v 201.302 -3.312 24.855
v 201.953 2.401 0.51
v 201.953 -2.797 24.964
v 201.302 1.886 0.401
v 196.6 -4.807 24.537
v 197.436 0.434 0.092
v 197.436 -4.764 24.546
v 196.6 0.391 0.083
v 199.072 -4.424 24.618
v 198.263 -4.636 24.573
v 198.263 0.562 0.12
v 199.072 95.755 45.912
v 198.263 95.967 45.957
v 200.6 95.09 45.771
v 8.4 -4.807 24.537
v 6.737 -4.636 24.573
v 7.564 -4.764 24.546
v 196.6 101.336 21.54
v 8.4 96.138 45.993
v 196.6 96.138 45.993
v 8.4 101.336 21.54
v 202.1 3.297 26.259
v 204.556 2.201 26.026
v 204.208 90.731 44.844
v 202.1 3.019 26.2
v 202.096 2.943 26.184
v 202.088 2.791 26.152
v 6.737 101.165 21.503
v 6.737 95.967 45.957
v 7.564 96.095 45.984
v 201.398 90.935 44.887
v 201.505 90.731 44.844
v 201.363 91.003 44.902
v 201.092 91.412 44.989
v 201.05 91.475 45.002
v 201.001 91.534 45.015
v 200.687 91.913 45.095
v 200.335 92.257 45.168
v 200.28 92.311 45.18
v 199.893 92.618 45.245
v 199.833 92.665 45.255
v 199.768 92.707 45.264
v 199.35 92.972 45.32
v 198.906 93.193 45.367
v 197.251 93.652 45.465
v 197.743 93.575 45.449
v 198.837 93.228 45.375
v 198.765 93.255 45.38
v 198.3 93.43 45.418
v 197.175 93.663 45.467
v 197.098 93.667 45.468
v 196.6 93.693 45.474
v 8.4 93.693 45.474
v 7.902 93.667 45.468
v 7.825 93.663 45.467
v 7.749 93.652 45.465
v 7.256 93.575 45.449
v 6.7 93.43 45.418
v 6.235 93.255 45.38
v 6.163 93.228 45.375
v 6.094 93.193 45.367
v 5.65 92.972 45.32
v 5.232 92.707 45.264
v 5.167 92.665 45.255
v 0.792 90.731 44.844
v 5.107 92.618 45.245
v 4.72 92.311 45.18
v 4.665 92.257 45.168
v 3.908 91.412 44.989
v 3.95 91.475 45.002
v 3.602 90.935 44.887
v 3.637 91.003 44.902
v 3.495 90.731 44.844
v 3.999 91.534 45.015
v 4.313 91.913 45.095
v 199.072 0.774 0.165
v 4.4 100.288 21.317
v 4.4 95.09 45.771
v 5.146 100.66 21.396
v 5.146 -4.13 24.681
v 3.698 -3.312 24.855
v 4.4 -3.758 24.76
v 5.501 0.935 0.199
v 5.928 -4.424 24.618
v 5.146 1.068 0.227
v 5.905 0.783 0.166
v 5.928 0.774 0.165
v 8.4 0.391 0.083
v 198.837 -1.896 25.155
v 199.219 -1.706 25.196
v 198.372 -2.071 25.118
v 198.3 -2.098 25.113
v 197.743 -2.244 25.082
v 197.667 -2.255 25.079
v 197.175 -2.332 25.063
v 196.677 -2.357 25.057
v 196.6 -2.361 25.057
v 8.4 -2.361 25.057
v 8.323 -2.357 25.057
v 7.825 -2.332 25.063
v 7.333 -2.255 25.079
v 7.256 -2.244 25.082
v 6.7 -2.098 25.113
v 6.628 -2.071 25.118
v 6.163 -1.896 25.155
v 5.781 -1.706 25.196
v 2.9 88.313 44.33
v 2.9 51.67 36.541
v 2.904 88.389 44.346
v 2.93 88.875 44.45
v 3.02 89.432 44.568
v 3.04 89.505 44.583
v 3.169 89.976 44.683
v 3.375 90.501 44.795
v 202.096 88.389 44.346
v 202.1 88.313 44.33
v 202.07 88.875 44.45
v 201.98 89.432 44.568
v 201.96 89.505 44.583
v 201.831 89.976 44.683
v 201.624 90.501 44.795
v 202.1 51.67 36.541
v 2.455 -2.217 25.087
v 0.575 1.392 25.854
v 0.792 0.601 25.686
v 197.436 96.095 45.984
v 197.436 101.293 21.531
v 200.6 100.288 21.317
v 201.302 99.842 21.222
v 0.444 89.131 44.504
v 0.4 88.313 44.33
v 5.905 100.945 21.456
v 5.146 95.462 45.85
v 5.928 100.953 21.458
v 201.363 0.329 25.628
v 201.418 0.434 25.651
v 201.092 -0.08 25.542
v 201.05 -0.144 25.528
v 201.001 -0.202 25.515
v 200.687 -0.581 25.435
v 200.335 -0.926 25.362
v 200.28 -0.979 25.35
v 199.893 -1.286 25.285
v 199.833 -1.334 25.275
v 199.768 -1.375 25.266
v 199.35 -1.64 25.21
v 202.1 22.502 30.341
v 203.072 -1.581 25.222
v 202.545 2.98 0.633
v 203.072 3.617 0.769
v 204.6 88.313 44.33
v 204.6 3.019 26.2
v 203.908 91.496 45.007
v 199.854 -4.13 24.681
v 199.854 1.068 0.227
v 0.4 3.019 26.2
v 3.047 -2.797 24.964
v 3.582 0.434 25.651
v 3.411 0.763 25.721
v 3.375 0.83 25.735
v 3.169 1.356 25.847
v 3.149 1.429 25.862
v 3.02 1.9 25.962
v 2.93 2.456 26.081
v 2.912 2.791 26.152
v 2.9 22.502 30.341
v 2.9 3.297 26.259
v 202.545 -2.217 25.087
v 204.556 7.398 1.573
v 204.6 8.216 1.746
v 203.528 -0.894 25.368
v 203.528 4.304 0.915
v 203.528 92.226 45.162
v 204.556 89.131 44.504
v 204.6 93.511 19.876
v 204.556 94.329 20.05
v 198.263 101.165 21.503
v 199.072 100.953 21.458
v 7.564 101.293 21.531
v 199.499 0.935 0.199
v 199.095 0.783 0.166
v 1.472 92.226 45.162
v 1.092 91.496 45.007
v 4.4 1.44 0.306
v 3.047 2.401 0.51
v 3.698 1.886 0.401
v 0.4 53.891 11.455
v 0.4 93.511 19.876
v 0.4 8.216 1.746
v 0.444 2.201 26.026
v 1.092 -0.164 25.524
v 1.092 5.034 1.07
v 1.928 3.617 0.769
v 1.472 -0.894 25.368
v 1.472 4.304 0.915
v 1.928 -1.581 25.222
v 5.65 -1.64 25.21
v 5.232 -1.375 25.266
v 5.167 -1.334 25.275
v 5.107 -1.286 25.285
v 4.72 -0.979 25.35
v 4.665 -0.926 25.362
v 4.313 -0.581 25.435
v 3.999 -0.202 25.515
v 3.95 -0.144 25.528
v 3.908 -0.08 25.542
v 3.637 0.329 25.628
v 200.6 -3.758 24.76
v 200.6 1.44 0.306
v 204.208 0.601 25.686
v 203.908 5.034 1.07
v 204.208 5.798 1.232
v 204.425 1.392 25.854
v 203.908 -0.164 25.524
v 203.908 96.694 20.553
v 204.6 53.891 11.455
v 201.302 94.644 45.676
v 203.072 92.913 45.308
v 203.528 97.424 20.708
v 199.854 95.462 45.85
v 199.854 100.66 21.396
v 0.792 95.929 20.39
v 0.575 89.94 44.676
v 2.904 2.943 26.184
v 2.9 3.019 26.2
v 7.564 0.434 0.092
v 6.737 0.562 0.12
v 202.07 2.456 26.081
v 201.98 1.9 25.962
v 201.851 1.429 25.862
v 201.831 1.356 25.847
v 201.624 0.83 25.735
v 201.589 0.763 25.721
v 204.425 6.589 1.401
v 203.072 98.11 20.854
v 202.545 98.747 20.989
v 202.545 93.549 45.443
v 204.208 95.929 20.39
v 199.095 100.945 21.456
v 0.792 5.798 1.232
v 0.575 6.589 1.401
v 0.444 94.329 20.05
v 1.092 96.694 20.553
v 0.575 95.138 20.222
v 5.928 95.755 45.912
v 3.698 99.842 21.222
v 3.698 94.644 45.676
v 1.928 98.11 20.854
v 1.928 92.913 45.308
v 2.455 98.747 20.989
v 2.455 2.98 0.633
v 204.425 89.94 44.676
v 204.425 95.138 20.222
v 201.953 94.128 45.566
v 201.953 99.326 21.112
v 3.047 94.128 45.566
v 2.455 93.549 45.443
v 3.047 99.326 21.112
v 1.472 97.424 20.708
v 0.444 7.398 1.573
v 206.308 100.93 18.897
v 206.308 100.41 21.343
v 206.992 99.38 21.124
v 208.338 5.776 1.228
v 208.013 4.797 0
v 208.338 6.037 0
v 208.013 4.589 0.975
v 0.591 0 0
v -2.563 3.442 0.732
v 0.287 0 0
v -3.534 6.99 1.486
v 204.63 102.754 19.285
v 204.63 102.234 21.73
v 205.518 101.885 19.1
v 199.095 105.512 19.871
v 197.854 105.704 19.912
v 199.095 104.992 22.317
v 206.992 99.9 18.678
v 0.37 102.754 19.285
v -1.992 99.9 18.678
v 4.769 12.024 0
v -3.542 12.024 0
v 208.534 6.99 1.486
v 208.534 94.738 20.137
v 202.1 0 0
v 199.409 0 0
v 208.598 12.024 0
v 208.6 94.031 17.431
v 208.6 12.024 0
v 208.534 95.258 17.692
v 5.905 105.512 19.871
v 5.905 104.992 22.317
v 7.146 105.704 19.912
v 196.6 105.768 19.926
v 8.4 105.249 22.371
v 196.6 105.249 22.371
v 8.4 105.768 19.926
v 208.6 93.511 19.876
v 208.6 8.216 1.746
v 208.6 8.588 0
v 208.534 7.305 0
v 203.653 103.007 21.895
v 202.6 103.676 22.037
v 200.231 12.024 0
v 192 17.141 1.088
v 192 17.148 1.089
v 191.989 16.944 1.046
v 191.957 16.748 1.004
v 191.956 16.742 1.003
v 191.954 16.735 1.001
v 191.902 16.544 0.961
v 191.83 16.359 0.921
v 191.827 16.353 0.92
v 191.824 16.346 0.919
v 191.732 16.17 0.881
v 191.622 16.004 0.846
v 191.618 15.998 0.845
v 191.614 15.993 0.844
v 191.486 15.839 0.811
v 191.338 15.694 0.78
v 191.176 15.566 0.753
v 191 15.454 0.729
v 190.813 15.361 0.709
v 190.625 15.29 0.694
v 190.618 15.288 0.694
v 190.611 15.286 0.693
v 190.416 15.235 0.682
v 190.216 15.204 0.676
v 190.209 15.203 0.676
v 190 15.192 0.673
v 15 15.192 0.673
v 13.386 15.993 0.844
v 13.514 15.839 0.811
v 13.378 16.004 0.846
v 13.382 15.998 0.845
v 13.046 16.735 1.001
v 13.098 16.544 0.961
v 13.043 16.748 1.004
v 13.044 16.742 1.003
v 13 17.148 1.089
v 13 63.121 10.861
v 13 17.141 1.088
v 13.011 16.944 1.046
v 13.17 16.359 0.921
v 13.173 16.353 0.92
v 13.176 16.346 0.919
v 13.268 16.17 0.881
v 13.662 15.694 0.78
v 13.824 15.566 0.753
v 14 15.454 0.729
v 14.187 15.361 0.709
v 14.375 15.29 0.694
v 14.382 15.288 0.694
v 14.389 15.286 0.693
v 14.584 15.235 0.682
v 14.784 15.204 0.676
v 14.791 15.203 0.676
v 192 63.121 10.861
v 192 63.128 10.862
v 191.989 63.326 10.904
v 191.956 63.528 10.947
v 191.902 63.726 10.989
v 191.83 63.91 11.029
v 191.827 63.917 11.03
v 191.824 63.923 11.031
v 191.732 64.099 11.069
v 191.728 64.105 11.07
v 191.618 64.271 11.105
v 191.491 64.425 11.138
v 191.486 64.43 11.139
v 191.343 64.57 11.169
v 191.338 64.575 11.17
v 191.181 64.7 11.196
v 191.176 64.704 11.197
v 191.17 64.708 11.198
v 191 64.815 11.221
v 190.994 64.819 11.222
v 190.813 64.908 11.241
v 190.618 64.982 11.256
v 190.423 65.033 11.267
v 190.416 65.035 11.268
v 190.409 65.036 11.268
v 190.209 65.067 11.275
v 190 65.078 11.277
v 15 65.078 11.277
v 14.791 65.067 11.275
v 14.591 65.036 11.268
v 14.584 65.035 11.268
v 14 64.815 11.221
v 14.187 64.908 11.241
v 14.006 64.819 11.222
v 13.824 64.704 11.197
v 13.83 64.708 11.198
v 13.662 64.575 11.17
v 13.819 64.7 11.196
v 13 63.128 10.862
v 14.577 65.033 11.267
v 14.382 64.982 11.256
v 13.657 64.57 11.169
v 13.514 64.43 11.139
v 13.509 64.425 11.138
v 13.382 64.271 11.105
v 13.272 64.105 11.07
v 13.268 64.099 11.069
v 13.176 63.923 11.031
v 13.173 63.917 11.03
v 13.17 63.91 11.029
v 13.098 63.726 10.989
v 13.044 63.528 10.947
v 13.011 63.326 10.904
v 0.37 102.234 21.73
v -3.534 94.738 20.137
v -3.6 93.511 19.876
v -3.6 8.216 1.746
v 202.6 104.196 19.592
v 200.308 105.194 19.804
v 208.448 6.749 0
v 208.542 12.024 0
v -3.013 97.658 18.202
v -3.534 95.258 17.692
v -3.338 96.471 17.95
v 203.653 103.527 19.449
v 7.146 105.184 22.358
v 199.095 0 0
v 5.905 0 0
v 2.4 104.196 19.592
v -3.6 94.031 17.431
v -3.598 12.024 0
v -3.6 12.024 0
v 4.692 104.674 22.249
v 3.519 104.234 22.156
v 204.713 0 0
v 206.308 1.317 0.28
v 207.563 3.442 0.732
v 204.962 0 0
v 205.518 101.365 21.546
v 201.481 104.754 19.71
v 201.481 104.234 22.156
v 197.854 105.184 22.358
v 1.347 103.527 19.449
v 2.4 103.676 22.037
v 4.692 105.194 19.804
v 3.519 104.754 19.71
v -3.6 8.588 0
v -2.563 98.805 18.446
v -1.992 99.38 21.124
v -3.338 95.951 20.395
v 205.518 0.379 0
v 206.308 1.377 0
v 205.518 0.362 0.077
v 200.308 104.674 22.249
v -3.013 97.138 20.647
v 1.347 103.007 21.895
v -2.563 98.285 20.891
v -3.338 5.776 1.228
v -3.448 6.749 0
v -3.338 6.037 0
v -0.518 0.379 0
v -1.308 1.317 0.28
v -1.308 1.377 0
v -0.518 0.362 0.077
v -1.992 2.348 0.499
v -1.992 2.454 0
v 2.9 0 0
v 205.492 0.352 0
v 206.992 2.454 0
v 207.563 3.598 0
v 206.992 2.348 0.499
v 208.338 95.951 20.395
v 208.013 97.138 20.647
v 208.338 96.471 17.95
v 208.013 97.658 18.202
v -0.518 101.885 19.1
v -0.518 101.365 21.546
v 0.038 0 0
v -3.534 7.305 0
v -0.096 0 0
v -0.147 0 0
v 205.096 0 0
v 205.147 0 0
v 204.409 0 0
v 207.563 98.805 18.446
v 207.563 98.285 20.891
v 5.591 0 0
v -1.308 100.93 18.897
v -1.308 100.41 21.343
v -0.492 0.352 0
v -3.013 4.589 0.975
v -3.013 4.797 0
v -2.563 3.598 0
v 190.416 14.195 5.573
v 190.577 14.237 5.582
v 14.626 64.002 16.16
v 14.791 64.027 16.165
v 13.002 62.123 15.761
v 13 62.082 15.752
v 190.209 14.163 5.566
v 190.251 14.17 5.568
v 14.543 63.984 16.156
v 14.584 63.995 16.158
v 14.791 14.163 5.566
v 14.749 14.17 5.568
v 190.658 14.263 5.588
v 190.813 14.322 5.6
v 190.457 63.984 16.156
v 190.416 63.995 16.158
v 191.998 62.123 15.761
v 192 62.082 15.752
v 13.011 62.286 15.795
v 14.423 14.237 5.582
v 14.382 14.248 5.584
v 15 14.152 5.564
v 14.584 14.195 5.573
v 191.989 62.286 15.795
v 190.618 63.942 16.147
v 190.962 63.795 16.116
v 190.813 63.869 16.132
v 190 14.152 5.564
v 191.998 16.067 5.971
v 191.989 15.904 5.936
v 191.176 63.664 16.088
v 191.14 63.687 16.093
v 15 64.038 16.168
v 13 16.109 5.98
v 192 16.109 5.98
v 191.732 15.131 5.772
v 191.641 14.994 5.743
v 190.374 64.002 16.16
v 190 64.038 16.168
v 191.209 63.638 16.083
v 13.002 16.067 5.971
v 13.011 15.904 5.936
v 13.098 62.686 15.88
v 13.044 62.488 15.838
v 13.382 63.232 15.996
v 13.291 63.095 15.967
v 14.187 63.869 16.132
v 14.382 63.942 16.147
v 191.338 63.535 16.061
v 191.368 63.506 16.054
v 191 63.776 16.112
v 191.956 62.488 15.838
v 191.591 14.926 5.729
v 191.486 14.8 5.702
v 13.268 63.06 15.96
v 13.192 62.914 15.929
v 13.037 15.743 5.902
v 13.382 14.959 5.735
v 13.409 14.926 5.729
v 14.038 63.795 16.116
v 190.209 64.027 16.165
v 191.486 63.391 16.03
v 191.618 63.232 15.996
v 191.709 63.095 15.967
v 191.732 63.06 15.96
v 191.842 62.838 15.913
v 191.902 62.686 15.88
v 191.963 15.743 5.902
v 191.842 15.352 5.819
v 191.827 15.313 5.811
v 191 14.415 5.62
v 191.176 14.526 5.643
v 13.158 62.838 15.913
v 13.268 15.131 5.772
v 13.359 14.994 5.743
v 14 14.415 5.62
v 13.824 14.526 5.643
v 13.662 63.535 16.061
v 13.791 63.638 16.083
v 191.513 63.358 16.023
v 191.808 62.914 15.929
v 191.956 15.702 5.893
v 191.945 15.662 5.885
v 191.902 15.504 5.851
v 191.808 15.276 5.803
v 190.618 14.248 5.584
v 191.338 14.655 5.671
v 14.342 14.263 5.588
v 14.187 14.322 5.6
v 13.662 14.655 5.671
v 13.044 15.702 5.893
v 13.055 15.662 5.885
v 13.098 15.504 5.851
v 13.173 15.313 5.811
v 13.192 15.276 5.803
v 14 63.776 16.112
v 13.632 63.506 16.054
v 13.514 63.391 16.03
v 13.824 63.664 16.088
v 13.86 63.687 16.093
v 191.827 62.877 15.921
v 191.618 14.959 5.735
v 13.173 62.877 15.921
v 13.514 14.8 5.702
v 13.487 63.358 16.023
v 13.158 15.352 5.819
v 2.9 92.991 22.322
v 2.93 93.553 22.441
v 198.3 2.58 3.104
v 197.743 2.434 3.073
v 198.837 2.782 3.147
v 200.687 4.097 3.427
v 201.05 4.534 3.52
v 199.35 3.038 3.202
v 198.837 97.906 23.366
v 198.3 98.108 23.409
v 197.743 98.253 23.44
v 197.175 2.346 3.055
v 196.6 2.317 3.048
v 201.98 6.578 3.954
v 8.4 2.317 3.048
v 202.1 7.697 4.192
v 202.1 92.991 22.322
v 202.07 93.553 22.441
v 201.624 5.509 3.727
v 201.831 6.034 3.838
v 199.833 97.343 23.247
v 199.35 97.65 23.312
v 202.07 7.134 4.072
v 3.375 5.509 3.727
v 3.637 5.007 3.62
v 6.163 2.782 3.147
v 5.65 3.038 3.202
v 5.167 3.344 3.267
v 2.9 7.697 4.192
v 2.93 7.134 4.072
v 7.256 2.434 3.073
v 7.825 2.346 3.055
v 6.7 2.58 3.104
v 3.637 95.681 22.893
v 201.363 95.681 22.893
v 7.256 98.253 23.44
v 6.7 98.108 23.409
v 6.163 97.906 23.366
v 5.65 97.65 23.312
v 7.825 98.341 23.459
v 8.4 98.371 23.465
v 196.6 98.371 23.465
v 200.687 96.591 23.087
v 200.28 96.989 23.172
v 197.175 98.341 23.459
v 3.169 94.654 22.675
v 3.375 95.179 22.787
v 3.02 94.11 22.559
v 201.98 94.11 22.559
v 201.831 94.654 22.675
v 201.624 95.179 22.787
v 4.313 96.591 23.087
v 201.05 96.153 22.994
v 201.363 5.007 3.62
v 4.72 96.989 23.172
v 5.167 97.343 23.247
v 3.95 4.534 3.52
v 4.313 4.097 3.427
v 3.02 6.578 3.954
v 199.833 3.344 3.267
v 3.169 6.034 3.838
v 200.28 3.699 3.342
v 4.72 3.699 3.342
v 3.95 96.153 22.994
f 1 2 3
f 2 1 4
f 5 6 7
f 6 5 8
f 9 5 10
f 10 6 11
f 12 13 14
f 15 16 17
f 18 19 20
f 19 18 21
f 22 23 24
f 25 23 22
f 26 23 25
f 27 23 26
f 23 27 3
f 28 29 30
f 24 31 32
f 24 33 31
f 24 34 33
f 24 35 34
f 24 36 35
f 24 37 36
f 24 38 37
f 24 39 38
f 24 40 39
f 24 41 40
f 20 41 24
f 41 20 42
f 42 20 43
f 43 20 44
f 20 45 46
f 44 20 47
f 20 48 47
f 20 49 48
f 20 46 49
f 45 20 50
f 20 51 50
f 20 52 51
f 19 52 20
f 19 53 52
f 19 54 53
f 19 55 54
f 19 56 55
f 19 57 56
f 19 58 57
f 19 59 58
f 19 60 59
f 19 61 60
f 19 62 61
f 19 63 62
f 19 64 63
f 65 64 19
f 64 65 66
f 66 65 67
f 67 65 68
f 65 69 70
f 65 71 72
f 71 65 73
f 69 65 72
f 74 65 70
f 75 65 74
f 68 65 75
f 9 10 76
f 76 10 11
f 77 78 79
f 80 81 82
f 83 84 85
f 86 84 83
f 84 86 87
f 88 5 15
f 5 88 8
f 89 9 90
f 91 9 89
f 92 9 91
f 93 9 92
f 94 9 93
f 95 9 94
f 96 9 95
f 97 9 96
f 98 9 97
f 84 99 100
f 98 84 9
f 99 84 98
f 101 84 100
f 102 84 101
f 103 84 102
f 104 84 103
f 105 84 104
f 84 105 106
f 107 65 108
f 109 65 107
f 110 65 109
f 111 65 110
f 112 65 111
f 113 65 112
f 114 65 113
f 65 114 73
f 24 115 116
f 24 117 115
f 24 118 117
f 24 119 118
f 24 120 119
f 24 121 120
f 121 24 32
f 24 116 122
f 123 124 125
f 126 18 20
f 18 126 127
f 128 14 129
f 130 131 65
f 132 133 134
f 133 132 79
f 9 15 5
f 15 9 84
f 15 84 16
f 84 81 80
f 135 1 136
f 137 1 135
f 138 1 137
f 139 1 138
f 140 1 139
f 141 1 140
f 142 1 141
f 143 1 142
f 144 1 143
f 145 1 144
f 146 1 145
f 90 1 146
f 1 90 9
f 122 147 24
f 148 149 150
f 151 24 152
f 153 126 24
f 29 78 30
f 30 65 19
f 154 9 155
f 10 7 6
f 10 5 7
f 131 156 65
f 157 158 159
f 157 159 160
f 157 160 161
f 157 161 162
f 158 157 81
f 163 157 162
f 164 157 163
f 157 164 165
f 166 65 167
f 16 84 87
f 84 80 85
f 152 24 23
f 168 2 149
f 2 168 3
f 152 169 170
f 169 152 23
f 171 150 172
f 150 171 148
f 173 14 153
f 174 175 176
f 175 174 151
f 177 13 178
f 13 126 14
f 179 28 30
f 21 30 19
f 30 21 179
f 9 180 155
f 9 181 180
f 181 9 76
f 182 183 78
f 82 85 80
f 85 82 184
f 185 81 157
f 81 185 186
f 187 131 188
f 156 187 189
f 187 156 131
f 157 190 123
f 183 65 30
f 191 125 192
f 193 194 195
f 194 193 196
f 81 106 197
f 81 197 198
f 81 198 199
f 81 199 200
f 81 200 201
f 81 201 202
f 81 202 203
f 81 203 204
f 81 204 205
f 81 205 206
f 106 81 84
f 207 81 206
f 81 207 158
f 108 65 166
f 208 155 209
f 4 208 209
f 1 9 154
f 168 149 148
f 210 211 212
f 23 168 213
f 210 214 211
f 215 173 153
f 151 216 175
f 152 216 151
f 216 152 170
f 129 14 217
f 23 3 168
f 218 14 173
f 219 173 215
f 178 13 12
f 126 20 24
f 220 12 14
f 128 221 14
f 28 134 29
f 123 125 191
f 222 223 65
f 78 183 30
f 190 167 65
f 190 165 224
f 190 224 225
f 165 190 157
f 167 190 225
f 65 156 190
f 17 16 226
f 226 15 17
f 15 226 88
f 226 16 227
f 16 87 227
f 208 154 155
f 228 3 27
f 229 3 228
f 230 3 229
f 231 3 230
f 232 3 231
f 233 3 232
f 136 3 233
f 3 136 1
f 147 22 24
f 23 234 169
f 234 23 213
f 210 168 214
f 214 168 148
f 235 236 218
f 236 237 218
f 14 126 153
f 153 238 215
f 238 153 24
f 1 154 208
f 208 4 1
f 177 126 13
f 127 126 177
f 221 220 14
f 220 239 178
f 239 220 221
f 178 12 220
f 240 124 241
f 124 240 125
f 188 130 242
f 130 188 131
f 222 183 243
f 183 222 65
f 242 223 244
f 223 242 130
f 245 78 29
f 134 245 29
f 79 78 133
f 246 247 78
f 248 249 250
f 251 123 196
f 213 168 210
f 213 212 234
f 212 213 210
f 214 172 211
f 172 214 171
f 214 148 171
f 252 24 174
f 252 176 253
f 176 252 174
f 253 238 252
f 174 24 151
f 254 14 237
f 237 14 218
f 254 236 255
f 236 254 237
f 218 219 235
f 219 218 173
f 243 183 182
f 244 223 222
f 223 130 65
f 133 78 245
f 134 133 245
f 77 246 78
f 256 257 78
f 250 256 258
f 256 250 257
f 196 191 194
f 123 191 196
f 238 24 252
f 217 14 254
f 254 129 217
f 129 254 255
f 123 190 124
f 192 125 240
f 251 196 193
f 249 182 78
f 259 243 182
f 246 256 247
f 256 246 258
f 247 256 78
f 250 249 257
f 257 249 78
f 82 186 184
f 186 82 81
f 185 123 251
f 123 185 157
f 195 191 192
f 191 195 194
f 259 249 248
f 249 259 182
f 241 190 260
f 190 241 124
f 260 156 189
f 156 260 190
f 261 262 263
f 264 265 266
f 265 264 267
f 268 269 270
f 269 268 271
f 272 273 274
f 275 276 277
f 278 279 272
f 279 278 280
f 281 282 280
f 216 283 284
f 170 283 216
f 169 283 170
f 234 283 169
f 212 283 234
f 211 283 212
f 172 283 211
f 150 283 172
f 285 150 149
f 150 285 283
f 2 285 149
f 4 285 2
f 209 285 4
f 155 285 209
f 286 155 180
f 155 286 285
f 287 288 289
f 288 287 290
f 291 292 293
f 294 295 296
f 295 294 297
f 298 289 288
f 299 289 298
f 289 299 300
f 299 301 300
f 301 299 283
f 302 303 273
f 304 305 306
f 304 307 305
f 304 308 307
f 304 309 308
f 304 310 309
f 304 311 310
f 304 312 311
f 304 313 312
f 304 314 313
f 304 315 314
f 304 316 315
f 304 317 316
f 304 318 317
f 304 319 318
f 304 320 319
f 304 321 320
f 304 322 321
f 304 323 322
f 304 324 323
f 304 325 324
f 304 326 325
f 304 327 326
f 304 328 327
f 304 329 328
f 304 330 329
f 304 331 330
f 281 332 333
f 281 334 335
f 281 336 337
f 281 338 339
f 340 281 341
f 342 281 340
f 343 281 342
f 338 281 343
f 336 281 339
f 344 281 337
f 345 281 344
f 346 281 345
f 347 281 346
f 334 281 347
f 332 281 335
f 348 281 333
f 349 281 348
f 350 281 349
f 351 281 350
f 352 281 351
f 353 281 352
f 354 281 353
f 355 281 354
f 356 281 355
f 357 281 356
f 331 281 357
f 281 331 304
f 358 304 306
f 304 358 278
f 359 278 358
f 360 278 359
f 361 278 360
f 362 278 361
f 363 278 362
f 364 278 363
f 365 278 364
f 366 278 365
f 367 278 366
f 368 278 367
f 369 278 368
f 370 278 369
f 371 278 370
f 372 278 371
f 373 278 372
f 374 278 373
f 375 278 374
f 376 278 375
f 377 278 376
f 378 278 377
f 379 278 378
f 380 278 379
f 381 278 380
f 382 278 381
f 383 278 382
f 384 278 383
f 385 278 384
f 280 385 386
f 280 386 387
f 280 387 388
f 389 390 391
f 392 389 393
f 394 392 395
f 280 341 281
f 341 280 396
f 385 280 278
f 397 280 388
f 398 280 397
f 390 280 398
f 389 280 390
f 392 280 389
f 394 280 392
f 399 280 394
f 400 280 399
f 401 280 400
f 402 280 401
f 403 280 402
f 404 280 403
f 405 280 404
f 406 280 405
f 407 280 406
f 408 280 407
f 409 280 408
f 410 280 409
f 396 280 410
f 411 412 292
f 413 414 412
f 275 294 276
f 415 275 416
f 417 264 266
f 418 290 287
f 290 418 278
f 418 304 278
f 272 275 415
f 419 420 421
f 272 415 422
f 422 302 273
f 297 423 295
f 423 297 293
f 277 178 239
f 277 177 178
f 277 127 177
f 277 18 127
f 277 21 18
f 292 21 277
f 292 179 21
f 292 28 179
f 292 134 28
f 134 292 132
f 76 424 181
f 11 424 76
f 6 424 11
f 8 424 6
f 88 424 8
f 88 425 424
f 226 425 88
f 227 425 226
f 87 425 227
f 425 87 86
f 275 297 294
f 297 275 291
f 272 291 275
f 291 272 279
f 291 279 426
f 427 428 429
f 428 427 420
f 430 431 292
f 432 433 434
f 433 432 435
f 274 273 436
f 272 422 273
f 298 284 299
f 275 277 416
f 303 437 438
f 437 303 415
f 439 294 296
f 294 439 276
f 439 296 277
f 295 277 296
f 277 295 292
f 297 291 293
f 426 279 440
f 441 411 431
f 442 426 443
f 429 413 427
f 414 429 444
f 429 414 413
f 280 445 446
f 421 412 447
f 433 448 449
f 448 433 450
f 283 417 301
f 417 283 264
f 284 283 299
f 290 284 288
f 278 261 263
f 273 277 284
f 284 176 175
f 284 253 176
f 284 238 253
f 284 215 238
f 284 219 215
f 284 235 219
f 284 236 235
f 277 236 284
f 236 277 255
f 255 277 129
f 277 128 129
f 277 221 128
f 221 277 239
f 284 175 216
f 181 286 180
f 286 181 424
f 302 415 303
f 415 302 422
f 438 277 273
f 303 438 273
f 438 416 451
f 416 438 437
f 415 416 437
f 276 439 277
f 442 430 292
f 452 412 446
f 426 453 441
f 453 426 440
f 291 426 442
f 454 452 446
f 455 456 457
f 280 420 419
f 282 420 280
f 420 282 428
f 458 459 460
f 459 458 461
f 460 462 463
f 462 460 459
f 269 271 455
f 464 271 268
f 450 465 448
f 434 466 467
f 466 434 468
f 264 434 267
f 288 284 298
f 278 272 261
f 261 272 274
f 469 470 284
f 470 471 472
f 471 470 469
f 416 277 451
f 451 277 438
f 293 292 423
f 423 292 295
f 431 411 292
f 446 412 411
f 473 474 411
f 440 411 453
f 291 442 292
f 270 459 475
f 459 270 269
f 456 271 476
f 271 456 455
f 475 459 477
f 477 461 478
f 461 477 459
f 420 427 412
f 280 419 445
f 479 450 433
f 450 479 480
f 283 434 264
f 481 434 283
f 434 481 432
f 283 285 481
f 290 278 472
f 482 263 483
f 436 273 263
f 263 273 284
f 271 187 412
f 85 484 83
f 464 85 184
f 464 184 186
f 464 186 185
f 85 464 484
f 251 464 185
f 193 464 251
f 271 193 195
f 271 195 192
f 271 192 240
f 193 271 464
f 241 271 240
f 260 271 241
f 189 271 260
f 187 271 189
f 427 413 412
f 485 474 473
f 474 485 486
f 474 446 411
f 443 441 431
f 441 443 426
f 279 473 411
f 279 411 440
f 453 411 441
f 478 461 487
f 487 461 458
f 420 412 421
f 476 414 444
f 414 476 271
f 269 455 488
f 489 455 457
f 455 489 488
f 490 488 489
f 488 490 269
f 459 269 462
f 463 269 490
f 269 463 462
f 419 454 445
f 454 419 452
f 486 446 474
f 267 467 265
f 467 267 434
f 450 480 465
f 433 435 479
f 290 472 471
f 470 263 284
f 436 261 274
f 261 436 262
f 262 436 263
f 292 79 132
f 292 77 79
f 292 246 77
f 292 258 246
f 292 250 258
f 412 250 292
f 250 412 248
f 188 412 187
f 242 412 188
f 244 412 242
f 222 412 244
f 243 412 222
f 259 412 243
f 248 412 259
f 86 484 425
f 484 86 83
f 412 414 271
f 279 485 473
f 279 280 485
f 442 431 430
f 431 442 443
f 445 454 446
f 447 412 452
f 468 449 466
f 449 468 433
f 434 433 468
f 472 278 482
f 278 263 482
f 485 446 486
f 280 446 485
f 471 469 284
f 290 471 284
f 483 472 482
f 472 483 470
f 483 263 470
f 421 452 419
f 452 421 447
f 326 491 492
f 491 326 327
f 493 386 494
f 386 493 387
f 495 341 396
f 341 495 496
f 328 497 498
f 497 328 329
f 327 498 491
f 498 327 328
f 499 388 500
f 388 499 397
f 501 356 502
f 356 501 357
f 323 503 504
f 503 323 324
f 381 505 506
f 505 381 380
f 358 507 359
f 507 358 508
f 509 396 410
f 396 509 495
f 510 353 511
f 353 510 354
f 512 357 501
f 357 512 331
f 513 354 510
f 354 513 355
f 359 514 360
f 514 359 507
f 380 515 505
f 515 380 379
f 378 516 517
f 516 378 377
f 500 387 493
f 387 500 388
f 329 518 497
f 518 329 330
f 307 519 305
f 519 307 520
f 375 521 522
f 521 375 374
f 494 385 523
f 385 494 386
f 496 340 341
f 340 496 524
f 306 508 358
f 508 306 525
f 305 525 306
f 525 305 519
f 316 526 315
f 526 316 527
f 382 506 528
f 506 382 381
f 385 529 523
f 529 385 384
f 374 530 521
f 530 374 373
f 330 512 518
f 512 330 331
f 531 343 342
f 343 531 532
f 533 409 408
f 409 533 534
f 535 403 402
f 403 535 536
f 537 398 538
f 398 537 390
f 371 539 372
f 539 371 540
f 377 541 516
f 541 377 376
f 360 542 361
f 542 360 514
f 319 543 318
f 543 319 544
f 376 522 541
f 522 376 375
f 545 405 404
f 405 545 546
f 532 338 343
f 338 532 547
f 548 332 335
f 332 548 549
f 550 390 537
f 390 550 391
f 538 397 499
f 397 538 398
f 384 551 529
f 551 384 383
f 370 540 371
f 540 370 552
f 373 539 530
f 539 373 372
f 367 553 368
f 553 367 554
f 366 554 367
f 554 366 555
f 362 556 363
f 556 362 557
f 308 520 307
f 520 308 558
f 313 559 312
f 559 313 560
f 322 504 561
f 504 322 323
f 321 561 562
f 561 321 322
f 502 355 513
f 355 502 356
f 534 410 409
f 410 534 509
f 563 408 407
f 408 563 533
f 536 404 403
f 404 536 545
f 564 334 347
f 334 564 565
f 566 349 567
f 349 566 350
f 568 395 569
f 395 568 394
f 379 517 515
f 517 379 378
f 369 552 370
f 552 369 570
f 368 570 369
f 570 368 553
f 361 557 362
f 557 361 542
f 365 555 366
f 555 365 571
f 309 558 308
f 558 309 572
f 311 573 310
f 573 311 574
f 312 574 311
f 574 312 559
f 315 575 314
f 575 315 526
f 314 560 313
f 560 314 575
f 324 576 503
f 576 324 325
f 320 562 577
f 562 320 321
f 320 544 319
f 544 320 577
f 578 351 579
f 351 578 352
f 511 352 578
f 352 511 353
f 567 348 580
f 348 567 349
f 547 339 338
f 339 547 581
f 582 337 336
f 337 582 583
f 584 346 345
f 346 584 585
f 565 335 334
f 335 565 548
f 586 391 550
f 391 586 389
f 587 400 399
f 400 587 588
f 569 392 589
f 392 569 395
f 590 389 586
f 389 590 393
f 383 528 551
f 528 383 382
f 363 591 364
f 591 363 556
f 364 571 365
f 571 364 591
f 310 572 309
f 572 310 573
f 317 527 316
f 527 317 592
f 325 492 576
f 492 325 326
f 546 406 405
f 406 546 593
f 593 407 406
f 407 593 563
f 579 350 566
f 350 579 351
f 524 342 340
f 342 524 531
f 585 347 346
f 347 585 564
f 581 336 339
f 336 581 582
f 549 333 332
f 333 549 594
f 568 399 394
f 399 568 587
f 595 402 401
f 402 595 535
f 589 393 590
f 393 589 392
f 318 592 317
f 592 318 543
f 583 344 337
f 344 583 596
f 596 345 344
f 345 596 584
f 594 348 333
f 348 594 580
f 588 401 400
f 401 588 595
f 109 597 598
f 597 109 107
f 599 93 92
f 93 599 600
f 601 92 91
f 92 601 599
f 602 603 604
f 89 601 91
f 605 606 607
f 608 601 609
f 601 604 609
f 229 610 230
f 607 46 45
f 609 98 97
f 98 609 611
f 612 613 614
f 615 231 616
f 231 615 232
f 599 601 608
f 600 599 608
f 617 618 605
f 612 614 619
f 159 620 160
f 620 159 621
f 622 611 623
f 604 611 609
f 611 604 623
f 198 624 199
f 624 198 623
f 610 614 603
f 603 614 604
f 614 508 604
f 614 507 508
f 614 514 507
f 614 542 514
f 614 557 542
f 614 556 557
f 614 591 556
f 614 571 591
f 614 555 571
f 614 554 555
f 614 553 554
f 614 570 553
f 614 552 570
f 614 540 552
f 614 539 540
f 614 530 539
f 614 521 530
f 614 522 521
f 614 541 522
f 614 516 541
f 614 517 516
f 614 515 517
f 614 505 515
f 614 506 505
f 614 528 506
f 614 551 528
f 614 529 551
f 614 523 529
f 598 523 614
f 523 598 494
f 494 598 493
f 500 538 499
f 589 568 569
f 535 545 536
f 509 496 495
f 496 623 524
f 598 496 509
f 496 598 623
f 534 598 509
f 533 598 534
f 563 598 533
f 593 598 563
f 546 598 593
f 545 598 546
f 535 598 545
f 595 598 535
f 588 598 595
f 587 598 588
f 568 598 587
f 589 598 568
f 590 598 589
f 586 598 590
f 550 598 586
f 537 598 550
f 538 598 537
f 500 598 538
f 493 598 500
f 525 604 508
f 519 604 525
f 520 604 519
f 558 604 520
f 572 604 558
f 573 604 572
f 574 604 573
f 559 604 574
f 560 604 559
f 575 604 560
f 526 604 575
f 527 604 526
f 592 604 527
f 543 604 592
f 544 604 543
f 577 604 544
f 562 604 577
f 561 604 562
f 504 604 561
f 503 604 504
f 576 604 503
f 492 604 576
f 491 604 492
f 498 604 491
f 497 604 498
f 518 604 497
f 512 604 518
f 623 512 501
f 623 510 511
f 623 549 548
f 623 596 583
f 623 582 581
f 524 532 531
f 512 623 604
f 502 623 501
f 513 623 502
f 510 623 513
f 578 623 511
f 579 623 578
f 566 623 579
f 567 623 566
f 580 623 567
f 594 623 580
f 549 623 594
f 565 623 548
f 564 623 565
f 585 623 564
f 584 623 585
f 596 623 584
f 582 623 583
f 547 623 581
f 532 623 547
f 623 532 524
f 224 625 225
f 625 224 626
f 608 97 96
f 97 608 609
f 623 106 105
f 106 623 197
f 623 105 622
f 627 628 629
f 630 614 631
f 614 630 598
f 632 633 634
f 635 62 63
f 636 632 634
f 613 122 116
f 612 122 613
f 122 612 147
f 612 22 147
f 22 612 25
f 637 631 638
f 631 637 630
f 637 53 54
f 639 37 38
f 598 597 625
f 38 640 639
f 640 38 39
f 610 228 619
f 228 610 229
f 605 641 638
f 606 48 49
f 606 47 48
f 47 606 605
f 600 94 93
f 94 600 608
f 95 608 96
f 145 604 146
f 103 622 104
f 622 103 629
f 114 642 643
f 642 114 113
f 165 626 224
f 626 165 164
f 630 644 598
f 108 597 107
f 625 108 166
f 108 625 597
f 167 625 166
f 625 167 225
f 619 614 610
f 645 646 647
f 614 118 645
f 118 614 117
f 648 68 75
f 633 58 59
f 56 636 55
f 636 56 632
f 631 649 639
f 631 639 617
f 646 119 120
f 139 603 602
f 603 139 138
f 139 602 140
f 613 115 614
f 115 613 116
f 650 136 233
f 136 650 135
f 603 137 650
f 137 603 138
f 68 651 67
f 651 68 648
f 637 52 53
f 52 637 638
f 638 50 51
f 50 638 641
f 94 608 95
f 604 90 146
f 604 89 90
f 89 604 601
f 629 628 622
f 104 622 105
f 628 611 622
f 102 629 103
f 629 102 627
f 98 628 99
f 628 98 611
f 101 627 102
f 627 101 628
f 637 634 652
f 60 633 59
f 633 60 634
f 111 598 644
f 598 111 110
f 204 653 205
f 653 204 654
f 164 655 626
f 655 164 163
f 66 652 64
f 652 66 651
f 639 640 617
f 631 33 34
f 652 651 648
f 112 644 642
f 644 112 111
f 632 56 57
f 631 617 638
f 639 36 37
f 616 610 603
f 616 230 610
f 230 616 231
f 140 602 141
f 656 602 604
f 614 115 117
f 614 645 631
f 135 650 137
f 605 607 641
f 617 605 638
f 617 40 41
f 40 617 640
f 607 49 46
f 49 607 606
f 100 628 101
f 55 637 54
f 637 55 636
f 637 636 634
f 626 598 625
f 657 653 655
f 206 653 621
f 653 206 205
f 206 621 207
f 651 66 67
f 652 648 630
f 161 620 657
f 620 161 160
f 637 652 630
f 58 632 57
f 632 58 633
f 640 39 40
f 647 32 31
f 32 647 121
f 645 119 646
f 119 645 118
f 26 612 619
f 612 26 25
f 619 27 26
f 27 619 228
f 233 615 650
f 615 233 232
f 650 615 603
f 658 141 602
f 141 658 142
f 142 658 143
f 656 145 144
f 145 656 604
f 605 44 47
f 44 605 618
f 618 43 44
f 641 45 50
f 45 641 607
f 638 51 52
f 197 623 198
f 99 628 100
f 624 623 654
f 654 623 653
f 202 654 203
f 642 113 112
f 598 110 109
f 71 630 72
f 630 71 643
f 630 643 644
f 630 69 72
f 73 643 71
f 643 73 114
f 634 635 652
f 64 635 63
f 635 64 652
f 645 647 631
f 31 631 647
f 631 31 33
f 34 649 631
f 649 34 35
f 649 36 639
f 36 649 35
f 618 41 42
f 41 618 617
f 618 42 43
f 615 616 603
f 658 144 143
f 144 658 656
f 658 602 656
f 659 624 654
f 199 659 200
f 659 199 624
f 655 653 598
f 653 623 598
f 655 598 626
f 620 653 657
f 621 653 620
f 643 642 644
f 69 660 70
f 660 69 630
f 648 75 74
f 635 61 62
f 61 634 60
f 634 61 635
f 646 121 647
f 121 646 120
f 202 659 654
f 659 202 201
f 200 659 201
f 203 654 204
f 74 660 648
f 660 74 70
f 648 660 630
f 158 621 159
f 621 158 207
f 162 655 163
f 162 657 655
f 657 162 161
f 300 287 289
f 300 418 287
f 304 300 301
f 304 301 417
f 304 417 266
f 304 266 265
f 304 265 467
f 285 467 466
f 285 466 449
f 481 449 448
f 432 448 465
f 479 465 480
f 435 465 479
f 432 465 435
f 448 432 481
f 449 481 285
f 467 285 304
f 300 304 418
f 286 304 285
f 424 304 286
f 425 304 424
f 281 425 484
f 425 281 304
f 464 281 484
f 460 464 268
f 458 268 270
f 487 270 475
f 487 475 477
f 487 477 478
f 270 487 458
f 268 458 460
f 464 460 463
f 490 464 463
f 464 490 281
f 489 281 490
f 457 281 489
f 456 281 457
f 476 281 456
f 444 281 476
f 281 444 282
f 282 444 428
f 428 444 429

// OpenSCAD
// Prado 2018 Radio Trim v3 — Refined from photo analysis
// OEM: Eclipse AVN-R8W  → 205.5 × 104mm face (Toyota 200mm wide format)
// New: Sony XAV-AX8500  → 178 × 50mm DIN chassis
//
// Key changes from v2:
// - Larger corner radius (~8mm) to match actual fascia opening
// - Dash angle ~12° tilt backward
// - DIN cutout positioned low (15mm from bottom)
// - Stepped edge profile on flange to match fascia recess

// ── Dimensions (mm) ──────────────────────────────────────────

// Outer = The cavity opening inside the gloss black fascia
// Using Eclipse face dimensions as proxy for what the dash accepts
outer_w = 205;       // slightly under Eclipse 205.5mm for clearance
outer_h = 104;       // Eclipse height

// Inner cutout = Sony DIN chassis
din_w = 179;          // Sony 178mm + 1mm clearance
din_h = 51;           // Sony 50mm + 1mm clearance

// Corner radii (from photo analysis — fascia has rounded corners ~8mm)
outer_r = 8;
din_r = 2;

// DIN cutout position (low in the opening — per photos and measurements)
din_x = (outer_w - din_w) / 2;   // ~13mm centered horizontally
din_y = 15;                        // 15mm from bottom edge

// Depth
depth = 25;           // body goes into the cavity

// Front flange (sits against the gloss fascia surface)
flange_overhang = 4;  // overlap beyond the cavity opening edge
flange_t = 2.5;       // thickness of the lip

// Dash angle (tilt backward — top of dash is further from driver than bottom)
dash_angle = 12;      // degrees from vertical (estimated from side photo)

// Wall thickness
wall = 2.5;

// Tolerances
tol = 0.4;            // clearance on outer dimensions

// ── Modules ──────────────────────────────────────────────────

$fn = 60;

module rounded_rect_2d(w, h, r) {
    offset(r) offset(-r)
        square([w, h]);
}

module angled_extrude(height, angle) {
    // Extrude along a tilted axis to match dash angle
    // The trim body tilts so the front face matches the dash surface angle
    multmatrix([
        [1, 0, 0, 0],
        [0, 1, -tan(angle), 0],
        [0, 0, 1, 0]
    ])
    linear_extrude(height)
        children();
}

// ── Main Trim Body ───────────────────────────────────────────

module trim() {
    difference() {
        union() {
            // Body — fits into the dash cavity
            // Angled to match dash tilt
            rotate([dash_angle, 0, 0])
            translate([tol, tol, 0])
            linear_extrude(depth)
                rounded_rect_2d(outer_w - tol*2, outer_h - tol*2, outer_r);

            // Front flange — sits on the fascia surface
            // NOT angled (sits flat against the angled dash face)
            rotate([dash_angle, 0, 0])
            translate([-(flange_overhang - tol), -(flange_overhang - tol), -flange_t])
            linear_extrude(flange_t)
                rounded_rect_2d(
                    outer_w + flange_overhang*2 - tol*2,
                    outer_h + flange_overhang*2 - tol*2,
                    outer_r + flange_overhang
                );
        }

        // DIN cutout — all the way through body + flange
        rotate([dash_angle, 0, 0])
        translate([din_x, din_y, -flange_t - 1])
        linear_extrude(depth + flange_t + 2)
            rounded_rect_2d(din_w, din_h, din_r);

        // Hollow out the body interior (save material, reduce print time)
        // Leave walls of 'wall' thickness on all sides
        rotate([dash_angle, 0, 0])
        translate([wall + tol, wall + tol, wall])
        linear_extrude(depth + 1)
            rounded_rect_2d(outer_w - wall*2 - tol*2, outer_h - wall*2 - tol*2, outer_r - wall);

        // Cut the bottom flat so it sits on the print bed
        translate([-50, -50, -100])
            cube([outer_w + 100, 100, 100]);
    }
}

// ── Build ────────────────────────────────────────────────────

trim();
